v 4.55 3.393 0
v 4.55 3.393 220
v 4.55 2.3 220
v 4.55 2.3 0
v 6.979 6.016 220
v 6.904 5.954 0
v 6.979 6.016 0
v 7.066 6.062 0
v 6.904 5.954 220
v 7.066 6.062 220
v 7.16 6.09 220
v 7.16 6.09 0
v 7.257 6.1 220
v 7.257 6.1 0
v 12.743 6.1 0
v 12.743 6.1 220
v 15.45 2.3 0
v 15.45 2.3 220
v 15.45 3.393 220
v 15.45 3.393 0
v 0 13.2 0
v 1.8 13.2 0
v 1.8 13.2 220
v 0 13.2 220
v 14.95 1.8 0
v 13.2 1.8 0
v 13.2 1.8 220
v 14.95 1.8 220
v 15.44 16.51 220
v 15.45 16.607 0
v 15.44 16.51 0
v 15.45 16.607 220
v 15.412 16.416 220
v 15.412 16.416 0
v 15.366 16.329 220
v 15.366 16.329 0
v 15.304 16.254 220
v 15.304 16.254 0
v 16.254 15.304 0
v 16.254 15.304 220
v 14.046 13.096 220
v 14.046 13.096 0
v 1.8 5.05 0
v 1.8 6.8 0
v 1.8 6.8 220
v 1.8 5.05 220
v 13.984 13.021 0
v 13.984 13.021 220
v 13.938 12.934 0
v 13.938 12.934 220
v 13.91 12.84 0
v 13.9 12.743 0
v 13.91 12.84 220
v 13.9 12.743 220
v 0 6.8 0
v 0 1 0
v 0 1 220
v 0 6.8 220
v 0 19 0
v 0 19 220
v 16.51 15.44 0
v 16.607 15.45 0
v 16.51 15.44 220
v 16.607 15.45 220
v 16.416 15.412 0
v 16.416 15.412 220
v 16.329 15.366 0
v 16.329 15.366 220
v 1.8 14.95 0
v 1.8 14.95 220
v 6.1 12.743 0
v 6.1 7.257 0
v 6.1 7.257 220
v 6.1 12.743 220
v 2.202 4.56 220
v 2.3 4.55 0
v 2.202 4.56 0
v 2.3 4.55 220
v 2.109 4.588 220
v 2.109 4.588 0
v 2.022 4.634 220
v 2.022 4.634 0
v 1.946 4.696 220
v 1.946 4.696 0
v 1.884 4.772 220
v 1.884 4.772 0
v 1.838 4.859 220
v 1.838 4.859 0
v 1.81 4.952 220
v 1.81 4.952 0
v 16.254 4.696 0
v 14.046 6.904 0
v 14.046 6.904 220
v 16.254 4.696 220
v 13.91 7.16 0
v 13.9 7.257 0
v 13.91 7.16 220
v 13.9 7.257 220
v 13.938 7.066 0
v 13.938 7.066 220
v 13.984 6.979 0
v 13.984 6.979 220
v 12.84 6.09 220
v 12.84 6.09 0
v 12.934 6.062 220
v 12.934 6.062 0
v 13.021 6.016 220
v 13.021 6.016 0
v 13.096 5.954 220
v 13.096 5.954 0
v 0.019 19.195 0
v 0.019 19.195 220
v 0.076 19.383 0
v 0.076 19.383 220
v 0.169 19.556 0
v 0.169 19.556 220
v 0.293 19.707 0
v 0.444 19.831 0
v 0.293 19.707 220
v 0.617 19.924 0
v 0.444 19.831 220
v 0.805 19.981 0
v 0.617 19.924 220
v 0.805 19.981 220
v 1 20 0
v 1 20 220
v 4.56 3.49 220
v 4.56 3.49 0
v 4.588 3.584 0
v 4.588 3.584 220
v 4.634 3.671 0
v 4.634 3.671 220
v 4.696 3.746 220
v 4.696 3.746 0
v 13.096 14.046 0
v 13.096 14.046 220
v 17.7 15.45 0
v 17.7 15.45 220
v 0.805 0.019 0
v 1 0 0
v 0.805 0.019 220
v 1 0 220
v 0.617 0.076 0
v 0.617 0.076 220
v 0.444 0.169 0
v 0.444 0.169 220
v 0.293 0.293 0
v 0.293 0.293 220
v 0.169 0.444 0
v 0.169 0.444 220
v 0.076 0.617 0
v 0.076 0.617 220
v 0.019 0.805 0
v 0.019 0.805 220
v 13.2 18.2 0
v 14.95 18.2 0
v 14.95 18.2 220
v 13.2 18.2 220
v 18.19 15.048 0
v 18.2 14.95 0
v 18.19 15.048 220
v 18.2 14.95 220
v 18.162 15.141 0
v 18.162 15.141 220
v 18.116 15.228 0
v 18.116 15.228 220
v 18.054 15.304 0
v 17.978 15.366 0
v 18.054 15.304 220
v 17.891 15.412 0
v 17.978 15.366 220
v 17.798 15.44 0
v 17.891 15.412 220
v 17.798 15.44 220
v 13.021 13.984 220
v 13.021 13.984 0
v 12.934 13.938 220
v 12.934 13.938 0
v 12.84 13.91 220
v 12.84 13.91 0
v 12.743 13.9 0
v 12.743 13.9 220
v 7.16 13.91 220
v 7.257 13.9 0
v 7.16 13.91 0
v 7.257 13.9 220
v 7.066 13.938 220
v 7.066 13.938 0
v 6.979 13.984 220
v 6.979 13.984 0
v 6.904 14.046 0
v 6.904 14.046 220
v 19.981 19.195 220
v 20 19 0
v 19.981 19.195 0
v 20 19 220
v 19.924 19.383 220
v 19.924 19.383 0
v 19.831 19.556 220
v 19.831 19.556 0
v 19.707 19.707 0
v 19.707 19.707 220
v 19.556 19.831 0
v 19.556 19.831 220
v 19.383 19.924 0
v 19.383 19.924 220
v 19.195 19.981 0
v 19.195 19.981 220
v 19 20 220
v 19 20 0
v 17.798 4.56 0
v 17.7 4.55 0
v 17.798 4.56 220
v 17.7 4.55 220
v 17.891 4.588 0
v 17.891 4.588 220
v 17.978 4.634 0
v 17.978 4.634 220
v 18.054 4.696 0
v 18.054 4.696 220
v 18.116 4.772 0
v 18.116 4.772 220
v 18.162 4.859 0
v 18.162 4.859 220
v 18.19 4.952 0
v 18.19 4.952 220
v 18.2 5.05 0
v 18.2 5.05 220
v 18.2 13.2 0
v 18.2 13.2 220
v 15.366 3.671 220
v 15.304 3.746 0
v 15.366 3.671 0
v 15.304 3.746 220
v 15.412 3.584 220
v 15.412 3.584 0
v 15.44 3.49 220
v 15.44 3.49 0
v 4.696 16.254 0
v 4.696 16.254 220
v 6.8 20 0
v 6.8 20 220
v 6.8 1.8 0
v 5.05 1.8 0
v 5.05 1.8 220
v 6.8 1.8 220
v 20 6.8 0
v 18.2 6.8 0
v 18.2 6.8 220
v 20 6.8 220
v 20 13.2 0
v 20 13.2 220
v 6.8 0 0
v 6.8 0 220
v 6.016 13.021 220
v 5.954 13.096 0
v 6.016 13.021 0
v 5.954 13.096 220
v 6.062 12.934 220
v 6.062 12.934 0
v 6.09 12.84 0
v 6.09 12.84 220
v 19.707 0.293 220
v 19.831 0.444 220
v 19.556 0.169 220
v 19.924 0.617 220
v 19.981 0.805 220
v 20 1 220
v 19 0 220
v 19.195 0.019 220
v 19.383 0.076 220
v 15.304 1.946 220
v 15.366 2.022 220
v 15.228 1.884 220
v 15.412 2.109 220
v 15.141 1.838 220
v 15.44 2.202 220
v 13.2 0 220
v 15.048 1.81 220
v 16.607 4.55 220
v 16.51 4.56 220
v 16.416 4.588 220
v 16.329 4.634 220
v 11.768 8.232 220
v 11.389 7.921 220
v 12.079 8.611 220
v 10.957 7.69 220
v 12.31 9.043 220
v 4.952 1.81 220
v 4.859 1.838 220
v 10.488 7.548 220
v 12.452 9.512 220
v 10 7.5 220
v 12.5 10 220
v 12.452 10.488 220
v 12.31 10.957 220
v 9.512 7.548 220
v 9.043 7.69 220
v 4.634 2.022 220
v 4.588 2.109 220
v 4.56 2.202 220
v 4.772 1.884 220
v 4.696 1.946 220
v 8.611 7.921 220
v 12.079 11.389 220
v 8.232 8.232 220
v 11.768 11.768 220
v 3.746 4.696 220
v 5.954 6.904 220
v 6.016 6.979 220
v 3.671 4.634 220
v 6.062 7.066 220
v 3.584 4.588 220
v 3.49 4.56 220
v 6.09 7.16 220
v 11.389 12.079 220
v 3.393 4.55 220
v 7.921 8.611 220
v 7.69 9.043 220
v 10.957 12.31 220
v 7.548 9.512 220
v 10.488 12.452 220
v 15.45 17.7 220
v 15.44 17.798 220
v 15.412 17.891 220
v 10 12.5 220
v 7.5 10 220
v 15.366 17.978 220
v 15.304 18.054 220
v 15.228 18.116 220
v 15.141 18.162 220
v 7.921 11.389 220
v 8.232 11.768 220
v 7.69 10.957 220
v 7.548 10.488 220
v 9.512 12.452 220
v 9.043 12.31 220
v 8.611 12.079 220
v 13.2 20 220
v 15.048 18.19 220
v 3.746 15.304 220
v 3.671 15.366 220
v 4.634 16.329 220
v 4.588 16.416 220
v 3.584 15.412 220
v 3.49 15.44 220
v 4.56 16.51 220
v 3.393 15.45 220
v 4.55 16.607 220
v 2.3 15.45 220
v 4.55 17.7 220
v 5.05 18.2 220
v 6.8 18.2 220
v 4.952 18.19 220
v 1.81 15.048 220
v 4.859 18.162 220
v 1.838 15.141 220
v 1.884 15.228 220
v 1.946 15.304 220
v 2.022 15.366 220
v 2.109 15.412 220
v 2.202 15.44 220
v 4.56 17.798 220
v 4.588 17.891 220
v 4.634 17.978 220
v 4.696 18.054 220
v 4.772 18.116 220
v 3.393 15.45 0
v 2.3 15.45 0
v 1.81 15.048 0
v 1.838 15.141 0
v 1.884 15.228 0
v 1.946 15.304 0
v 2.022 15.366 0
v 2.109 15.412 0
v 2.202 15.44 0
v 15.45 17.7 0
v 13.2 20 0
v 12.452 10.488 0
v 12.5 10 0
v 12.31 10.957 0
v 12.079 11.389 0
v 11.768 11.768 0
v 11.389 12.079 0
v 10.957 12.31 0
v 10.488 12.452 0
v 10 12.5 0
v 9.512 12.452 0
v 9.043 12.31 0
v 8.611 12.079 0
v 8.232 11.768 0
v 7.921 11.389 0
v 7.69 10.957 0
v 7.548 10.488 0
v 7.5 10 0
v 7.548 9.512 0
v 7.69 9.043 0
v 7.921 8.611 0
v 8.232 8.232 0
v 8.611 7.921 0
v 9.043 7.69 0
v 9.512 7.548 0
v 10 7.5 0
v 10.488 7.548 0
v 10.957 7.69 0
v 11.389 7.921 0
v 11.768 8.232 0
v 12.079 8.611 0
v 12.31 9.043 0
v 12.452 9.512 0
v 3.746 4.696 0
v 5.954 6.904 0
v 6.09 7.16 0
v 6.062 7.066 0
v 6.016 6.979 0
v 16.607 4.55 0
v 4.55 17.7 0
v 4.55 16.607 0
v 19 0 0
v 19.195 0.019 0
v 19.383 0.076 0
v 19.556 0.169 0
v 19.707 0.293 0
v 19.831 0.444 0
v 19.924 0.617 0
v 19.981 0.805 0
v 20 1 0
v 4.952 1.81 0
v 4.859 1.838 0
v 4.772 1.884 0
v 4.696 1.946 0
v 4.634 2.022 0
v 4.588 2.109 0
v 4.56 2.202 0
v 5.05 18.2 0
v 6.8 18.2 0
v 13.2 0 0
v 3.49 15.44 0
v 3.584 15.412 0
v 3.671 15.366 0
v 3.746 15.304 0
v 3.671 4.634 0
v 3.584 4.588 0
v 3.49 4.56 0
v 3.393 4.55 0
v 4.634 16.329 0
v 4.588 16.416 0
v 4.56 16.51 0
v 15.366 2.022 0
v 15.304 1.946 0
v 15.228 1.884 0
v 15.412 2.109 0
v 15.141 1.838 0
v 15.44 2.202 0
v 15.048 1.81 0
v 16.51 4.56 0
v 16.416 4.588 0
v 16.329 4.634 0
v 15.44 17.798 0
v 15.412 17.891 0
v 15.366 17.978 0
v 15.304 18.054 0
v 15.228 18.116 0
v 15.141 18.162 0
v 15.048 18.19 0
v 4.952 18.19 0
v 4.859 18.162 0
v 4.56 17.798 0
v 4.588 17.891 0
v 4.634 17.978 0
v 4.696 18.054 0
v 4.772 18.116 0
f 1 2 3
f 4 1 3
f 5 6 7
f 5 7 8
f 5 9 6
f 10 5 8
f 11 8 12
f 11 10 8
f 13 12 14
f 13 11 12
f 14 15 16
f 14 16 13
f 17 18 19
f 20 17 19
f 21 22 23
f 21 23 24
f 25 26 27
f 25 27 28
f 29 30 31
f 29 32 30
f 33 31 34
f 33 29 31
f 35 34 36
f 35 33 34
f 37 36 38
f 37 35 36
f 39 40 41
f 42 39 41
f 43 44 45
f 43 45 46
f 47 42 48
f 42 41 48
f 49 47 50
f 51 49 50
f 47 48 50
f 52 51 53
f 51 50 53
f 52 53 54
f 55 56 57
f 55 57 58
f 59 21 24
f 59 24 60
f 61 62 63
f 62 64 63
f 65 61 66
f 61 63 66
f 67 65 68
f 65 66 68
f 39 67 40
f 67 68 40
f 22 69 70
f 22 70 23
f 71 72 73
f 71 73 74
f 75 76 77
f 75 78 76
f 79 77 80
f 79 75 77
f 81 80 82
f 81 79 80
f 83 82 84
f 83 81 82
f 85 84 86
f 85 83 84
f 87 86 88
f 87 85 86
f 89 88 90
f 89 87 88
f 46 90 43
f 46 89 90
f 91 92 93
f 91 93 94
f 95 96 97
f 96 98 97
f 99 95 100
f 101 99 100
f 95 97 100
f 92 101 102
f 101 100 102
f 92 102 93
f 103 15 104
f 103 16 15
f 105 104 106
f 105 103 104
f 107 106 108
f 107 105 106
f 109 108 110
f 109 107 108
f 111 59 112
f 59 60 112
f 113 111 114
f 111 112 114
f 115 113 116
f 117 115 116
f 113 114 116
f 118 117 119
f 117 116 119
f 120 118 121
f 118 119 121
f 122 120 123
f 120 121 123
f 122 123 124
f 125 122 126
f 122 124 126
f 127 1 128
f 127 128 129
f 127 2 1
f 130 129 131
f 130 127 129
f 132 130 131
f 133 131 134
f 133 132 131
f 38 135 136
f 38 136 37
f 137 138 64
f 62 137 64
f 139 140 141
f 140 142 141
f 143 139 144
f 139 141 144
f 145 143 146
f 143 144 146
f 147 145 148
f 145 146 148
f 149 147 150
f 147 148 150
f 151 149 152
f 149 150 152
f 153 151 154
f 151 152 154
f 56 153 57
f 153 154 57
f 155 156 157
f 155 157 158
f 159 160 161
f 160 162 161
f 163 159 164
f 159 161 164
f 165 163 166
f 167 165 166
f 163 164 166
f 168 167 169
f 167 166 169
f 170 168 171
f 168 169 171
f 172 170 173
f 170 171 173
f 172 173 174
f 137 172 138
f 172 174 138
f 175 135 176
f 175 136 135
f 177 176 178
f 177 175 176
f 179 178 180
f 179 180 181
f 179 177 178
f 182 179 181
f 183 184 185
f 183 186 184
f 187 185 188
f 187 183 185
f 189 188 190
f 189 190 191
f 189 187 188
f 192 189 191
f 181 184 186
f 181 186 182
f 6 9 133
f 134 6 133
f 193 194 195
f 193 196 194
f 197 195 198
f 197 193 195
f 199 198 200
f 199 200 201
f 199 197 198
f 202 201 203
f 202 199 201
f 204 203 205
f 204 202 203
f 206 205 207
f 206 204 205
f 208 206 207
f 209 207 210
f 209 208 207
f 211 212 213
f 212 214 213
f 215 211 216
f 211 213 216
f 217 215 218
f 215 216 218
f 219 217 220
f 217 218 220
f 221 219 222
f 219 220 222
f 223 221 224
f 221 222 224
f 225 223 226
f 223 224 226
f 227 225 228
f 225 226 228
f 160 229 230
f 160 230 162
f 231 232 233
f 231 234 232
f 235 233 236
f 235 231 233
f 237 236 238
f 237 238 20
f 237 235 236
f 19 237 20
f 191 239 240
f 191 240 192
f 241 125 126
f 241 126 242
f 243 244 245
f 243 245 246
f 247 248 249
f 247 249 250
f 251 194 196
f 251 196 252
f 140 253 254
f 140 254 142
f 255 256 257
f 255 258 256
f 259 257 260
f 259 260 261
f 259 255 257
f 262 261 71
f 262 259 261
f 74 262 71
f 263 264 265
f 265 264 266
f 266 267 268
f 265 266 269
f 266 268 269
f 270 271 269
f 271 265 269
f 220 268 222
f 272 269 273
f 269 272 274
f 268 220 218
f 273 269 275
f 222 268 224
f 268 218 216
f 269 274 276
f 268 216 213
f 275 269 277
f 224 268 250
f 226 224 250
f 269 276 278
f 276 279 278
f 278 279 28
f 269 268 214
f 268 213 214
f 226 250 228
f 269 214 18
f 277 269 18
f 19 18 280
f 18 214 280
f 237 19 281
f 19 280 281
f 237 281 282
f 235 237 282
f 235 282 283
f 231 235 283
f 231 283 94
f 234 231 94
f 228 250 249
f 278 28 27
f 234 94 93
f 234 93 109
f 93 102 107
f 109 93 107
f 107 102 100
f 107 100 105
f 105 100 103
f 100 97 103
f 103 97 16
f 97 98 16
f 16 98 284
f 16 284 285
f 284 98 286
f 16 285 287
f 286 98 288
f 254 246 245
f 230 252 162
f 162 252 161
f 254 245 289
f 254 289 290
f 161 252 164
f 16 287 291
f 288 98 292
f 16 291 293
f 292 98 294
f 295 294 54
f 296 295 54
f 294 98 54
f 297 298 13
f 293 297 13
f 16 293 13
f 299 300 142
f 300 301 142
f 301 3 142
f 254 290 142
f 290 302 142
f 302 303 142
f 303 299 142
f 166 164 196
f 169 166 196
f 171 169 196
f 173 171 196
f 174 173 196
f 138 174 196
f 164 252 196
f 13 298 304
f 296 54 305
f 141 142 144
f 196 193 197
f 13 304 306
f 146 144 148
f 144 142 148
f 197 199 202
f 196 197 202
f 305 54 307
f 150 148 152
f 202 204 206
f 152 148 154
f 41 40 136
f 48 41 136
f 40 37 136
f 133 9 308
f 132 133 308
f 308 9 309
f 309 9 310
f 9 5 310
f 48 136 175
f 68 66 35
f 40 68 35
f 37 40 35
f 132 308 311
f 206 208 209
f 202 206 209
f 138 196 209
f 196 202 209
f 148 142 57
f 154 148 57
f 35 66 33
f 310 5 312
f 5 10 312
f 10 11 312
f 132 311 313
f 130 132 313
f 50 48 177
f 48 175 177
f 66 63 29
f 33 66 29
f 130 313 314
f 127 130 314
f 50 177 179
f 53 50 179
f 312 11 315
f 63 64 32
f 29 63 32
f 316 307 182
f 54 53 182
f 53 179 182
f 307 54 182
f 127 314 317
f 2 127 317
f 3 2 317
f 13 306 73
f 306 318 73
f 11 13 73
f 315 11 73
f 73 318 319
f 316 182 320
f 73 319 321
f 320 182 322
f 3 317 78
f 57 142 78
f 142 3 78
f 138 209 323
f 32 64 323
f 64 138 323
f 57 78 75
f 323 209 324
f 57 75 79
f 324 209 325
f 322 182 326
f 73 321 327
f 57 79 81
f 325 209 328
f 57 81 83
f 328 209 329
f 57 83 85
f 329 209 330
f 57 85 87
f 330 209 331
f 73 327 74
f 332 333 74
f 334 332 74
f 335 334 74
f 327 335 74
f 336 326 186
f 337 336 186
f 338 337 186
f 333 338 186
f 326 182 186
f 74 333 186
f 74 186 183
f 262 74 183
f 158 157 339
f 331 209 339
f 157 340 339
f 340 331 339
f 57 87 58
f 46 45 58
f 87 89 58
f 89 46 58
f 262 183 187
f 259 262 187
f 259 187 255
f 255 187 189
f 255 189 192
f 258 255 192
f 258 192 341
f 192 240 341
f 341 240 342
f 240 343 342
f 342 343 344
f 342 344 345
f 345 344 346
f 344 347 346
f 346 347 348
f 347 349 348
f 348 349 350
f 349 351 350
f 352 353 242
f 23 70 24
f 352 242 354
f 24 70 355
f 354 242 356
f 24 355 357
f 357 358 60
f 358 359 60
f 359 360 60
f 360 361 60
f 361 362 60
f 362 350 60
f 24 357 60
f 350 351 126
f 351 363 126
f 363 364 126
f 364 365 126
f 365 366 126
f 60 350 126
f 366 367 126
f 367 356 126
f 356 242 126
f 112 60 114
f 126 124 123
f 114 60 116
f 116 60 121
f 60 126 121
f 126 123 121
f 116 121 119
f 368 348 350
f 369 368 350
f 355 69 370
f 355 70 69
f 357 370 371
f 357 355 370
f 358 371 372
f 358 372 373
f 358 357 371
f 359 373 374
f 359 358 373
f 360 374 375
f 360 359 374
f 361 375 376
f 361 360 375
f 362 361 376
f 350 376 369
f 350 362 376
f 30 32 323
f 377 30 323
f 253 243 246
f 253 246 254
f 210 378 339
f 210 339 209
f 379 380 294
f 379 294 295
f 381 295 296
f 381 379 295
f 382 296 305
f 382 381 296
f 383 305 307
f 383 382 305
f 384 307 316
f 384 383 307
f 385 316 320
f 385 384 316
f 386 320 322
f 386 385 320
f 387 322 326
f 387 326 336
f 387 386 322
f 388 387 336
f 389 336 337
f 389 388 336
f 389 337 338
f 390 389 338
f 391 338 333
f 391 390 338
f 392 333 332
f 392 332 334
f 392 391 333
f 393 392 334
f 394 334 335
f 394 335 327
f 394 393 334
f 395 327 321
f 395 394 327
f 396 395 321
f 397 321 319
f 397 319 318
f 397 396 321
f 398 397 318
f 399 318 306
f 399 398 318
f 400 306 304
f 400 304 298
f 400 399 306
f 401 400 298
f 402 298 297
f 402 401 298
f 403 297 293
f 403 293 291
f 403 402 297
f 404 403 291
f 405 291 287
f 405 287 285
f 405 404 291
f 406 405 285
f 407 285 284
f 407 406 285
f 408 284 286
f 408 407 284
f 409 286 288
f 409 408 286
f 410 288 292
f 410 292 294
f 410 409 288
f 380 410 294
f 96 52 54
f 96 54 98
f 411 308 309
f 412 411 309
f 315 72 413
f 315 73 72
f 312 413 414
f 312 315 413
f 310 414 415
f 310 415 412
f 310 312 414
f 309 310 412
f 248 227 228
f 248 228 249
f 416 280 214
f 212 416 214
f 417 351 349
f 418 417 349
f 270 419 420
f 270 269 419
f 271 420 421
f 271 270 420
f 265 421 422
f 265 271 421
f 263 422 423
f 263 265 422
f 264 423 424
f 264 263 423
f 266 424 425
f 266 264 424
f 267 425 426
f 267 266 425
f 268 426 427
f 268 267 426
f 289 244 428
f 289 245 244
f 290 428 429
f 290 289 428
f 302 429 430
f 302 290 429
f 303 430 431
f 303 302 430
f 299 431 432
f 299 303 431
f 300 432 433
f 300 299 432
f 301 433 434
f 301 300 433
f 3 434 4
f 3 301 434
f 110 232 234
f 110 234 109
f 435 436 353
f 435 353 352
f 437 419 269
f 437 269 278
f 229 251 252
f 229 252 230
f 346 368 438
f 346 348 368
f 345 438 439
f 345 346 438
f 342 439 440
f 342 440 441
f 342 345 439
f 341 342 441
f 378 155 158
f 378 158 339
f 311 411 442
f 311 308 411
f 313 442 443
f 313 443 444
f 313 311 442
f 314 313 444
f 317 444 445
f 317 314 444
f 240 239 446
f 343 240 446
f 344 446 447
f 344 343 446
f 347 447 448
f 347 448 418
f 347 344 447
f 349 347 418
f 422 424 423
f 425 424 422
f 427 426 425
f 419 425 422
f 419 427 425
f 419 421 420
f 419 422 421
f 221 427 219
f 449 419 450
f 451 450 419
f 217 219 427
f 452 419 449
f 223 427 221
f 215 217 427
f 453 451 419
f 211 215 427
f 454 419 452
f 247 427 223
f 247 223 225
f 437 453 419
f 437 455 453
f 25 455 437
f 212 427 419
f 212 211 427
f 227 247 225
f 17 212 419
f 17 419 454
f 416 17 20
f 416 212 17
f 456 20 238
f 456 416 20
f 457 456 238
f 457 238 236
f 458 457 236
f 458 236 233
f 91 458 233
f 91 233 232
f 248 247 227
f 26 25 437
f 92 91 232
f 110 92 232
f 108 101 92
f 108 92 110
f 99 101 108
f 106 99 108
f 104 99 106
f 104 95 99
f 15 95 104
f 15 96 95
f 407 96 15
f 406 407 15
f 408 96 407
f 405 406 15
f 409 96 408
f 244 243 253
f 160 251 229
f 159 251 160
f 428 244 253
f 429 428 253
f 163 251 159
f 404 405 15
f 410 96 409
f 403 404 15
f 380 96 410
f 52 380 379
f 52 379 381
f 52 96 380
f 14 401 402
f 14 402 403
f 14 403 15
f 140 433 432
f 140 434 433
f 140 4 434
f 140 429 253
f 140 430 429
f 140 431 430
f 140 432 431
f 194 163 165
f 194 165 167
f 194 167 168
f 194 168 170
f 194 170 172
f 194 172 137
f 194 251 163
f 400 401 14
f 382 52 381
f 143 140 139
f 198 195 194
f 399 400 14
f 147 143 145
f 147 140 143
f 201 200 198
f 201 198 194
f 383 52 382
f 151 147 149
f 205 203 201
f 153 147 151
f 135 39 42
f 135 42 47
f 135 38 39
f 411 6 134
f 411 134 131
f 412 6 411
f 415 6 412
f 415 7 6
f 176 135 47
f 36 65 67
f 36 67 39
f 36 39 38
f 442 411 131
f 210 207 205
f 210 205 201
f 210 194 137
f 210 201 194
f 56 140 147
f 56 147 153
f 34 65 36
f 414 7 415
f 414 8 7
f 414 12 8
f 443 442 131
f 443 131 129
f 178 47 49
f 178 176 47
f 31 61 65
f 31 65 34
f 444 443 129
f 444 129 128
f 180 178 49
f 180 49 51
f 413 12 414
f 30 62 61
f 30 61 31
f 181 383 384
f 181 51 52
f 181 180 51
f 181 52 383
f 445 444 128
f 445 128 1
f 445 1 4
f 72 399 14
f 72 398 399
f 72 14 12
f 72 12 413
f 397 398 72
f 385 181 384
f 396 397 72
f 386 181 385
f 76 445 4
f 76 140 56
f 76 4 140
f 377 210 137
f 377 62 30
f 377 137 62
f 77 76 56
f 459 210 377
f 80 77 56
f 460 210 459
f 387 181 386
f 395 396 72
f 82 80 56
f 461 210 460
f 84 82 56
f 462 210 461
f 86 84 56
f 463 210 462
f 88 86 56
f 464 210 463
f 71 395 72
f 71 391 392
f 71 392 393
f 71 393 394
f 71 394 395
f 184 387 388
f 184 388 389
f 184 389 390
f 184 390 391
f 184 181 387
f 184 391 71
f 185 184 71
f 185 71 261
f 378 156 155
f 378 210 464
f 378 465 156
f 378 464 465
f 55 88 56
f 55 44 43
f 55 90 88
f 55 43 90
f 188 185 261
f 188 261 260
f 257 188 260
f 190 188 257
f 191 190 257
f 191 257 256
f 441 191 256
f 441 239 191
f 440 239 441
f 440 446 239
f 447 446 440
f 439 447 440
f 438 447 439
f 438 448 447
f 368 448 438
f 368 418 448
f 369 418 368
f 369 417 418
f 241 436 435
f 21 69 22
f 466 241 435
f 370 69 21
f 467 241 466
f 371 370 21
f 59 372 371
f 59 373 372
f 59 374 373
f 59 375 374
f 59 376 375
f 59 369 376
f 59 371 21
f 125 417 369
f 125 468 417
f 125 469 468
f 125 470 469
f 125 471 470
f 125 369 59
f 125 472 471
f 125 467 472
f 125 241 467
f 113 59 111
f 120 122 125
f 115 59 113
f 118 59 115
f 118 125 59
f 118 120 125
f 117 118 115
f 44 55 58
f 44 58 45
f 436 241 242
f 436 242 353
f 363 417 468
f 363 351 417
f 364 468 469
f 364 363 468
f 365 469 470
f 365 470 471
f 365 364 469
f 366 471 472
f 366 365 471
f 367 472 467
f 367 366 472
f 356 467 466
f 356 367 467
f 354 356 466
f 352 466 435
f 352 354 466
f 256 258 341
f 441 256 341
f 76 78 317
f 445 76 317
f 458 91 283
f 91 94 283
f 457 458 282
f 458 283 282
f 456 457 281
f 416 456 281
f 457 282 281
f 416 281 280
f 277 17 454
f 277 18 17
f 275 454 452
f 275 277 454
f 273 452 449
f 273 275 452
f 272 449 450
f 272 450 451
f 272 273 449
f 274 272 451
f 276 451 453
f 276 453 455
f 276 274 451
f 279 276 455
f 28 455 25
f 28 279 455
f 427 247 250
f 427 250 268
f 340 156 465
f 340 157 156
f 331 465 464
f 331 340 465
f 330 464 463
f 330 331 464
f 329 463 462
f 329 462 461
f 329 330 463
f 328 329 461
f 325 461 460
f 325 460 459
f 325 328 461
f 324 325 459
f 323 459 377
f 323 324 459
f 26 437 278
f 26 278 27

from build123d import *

# Parameters (mm, degrees)
SKETCH1_R           = 2.5
BOSS_EXTRUDE1_DEPTH = 220
FILLET1_R           = 1
FILLET2_R           = 0.5
FILLET3_R           = 0.5
FILLET4_R           = 0.5
FILLET5_R           = 0.5


with BuildPart() as part:
    # Sketch1 → Boss-Extrude1 (new body)
    with BuildSketch(Plane.XY):
        Polygon((13.2, 0), (13.2, 1.8), (15.45, 1.8), (15.45, 3.6), (12.95, 6.1), (7.05, 6.1), (4.55, 3.6), (4.55, 1.8), (6.8, 1.8), (6.8, 0), (0, 0), (0, 6.8), (1.8, 6.8), (1.8, 4.55), (3.6, 4.55), (6.1, 7.05), (6.1, 12.95), (3.6, 15.45), (1.8, 15.45), (1.8, 13.2), (0, 13.2), (0, 20), (6.8, 20), (6.8, 18.2), (4.55, 18.2), (4.55, 16.4), (7.05, 13.9), (12.95, 13.9), (15.45, 16.4), (15.45, 18.2), (13.2, 18.2), (13.2, 20), (20, 20), (20, 13.2), (18.2, 13.2), (18.2, 15.45), (16.4, 15.45), (13.9, 12.95), (13.9, 7.05), (16.4, 4.55), (18.2, 4.55), (18.2, 6.8), (20, 6.8), (20, 0), align=None)
        with Locations((10, 10)):
            Circle(SKETCH1_R, mode=Mode.SUBTRACT)
    extrude(amount=BOSS_EXTRUDE1_DEPTH)

    # Fillet1
    fillet1_edges = [part.edges().sort_by_distance(p)[0] for p in [
        (0, 0, 110),
        (0, 20, 110),
        (20, 20, 110),
        (20, 0, 110),
    ]]
    fillet(fillet1_edges, radius=FILLET1_R)

    # Fillet2
    fillet2_edges = [part.edges().sort_by_distance(p)[0] for p in [
        (4.55, 18.2, 110),
        (4.55, 16.4, 110),
        (7.05, 13.9, 110),
        (12.95, 13.9, 110),
        (15.45, 16.4, 110),
        (15.45, 18.2, 110),
    ]]
    fillet(fillet2_edges, radius=FILLET2_R)

    # Fillet3
    fillet3_edges = [part.edges().sort_by_distance(p)[0] for p in [
        (18.2, 15.45, 110),
        (16.4, 15.45, 110),
        (13.9, 12.95, 110),
        (13.9, 7.05, 110),
        (16.4, 4.55, 110),
        (18.2, 4.55, 110),
    ]]
    fillet(fillet3_edges, radius=FILLET3_R)

    # Fillet4
    fillet4_edges = [part.edges().sort_by_distance(p)[0] for p in [
        (1.8, 4.55, 110),
        (3.6, 4.55, 110),
        (6.1, 7.05, 110),
        (6.1, 12.95, 110),
        (3.6, 15.45, 110),
        (1.8, 15.45, 110),
    ]]
    fillet(fillet4_edges, radius=FILLET4_R)

    # Fillet5
    fillet5_edges = [part.edges().sort_by_distance(p)[0] for p in [
        (15.45, 1.8, 110),
        (15.45, 3.6, 110),
        (12.95, 6.1, 110),
        (7.05, 6.1, 110),
        (4.55, 3.6, 110),
        (4.55, 1.8, 110),
    ]]
    fillet(fillet5_edges, radius=FILLET5_R)


solid = part.part
